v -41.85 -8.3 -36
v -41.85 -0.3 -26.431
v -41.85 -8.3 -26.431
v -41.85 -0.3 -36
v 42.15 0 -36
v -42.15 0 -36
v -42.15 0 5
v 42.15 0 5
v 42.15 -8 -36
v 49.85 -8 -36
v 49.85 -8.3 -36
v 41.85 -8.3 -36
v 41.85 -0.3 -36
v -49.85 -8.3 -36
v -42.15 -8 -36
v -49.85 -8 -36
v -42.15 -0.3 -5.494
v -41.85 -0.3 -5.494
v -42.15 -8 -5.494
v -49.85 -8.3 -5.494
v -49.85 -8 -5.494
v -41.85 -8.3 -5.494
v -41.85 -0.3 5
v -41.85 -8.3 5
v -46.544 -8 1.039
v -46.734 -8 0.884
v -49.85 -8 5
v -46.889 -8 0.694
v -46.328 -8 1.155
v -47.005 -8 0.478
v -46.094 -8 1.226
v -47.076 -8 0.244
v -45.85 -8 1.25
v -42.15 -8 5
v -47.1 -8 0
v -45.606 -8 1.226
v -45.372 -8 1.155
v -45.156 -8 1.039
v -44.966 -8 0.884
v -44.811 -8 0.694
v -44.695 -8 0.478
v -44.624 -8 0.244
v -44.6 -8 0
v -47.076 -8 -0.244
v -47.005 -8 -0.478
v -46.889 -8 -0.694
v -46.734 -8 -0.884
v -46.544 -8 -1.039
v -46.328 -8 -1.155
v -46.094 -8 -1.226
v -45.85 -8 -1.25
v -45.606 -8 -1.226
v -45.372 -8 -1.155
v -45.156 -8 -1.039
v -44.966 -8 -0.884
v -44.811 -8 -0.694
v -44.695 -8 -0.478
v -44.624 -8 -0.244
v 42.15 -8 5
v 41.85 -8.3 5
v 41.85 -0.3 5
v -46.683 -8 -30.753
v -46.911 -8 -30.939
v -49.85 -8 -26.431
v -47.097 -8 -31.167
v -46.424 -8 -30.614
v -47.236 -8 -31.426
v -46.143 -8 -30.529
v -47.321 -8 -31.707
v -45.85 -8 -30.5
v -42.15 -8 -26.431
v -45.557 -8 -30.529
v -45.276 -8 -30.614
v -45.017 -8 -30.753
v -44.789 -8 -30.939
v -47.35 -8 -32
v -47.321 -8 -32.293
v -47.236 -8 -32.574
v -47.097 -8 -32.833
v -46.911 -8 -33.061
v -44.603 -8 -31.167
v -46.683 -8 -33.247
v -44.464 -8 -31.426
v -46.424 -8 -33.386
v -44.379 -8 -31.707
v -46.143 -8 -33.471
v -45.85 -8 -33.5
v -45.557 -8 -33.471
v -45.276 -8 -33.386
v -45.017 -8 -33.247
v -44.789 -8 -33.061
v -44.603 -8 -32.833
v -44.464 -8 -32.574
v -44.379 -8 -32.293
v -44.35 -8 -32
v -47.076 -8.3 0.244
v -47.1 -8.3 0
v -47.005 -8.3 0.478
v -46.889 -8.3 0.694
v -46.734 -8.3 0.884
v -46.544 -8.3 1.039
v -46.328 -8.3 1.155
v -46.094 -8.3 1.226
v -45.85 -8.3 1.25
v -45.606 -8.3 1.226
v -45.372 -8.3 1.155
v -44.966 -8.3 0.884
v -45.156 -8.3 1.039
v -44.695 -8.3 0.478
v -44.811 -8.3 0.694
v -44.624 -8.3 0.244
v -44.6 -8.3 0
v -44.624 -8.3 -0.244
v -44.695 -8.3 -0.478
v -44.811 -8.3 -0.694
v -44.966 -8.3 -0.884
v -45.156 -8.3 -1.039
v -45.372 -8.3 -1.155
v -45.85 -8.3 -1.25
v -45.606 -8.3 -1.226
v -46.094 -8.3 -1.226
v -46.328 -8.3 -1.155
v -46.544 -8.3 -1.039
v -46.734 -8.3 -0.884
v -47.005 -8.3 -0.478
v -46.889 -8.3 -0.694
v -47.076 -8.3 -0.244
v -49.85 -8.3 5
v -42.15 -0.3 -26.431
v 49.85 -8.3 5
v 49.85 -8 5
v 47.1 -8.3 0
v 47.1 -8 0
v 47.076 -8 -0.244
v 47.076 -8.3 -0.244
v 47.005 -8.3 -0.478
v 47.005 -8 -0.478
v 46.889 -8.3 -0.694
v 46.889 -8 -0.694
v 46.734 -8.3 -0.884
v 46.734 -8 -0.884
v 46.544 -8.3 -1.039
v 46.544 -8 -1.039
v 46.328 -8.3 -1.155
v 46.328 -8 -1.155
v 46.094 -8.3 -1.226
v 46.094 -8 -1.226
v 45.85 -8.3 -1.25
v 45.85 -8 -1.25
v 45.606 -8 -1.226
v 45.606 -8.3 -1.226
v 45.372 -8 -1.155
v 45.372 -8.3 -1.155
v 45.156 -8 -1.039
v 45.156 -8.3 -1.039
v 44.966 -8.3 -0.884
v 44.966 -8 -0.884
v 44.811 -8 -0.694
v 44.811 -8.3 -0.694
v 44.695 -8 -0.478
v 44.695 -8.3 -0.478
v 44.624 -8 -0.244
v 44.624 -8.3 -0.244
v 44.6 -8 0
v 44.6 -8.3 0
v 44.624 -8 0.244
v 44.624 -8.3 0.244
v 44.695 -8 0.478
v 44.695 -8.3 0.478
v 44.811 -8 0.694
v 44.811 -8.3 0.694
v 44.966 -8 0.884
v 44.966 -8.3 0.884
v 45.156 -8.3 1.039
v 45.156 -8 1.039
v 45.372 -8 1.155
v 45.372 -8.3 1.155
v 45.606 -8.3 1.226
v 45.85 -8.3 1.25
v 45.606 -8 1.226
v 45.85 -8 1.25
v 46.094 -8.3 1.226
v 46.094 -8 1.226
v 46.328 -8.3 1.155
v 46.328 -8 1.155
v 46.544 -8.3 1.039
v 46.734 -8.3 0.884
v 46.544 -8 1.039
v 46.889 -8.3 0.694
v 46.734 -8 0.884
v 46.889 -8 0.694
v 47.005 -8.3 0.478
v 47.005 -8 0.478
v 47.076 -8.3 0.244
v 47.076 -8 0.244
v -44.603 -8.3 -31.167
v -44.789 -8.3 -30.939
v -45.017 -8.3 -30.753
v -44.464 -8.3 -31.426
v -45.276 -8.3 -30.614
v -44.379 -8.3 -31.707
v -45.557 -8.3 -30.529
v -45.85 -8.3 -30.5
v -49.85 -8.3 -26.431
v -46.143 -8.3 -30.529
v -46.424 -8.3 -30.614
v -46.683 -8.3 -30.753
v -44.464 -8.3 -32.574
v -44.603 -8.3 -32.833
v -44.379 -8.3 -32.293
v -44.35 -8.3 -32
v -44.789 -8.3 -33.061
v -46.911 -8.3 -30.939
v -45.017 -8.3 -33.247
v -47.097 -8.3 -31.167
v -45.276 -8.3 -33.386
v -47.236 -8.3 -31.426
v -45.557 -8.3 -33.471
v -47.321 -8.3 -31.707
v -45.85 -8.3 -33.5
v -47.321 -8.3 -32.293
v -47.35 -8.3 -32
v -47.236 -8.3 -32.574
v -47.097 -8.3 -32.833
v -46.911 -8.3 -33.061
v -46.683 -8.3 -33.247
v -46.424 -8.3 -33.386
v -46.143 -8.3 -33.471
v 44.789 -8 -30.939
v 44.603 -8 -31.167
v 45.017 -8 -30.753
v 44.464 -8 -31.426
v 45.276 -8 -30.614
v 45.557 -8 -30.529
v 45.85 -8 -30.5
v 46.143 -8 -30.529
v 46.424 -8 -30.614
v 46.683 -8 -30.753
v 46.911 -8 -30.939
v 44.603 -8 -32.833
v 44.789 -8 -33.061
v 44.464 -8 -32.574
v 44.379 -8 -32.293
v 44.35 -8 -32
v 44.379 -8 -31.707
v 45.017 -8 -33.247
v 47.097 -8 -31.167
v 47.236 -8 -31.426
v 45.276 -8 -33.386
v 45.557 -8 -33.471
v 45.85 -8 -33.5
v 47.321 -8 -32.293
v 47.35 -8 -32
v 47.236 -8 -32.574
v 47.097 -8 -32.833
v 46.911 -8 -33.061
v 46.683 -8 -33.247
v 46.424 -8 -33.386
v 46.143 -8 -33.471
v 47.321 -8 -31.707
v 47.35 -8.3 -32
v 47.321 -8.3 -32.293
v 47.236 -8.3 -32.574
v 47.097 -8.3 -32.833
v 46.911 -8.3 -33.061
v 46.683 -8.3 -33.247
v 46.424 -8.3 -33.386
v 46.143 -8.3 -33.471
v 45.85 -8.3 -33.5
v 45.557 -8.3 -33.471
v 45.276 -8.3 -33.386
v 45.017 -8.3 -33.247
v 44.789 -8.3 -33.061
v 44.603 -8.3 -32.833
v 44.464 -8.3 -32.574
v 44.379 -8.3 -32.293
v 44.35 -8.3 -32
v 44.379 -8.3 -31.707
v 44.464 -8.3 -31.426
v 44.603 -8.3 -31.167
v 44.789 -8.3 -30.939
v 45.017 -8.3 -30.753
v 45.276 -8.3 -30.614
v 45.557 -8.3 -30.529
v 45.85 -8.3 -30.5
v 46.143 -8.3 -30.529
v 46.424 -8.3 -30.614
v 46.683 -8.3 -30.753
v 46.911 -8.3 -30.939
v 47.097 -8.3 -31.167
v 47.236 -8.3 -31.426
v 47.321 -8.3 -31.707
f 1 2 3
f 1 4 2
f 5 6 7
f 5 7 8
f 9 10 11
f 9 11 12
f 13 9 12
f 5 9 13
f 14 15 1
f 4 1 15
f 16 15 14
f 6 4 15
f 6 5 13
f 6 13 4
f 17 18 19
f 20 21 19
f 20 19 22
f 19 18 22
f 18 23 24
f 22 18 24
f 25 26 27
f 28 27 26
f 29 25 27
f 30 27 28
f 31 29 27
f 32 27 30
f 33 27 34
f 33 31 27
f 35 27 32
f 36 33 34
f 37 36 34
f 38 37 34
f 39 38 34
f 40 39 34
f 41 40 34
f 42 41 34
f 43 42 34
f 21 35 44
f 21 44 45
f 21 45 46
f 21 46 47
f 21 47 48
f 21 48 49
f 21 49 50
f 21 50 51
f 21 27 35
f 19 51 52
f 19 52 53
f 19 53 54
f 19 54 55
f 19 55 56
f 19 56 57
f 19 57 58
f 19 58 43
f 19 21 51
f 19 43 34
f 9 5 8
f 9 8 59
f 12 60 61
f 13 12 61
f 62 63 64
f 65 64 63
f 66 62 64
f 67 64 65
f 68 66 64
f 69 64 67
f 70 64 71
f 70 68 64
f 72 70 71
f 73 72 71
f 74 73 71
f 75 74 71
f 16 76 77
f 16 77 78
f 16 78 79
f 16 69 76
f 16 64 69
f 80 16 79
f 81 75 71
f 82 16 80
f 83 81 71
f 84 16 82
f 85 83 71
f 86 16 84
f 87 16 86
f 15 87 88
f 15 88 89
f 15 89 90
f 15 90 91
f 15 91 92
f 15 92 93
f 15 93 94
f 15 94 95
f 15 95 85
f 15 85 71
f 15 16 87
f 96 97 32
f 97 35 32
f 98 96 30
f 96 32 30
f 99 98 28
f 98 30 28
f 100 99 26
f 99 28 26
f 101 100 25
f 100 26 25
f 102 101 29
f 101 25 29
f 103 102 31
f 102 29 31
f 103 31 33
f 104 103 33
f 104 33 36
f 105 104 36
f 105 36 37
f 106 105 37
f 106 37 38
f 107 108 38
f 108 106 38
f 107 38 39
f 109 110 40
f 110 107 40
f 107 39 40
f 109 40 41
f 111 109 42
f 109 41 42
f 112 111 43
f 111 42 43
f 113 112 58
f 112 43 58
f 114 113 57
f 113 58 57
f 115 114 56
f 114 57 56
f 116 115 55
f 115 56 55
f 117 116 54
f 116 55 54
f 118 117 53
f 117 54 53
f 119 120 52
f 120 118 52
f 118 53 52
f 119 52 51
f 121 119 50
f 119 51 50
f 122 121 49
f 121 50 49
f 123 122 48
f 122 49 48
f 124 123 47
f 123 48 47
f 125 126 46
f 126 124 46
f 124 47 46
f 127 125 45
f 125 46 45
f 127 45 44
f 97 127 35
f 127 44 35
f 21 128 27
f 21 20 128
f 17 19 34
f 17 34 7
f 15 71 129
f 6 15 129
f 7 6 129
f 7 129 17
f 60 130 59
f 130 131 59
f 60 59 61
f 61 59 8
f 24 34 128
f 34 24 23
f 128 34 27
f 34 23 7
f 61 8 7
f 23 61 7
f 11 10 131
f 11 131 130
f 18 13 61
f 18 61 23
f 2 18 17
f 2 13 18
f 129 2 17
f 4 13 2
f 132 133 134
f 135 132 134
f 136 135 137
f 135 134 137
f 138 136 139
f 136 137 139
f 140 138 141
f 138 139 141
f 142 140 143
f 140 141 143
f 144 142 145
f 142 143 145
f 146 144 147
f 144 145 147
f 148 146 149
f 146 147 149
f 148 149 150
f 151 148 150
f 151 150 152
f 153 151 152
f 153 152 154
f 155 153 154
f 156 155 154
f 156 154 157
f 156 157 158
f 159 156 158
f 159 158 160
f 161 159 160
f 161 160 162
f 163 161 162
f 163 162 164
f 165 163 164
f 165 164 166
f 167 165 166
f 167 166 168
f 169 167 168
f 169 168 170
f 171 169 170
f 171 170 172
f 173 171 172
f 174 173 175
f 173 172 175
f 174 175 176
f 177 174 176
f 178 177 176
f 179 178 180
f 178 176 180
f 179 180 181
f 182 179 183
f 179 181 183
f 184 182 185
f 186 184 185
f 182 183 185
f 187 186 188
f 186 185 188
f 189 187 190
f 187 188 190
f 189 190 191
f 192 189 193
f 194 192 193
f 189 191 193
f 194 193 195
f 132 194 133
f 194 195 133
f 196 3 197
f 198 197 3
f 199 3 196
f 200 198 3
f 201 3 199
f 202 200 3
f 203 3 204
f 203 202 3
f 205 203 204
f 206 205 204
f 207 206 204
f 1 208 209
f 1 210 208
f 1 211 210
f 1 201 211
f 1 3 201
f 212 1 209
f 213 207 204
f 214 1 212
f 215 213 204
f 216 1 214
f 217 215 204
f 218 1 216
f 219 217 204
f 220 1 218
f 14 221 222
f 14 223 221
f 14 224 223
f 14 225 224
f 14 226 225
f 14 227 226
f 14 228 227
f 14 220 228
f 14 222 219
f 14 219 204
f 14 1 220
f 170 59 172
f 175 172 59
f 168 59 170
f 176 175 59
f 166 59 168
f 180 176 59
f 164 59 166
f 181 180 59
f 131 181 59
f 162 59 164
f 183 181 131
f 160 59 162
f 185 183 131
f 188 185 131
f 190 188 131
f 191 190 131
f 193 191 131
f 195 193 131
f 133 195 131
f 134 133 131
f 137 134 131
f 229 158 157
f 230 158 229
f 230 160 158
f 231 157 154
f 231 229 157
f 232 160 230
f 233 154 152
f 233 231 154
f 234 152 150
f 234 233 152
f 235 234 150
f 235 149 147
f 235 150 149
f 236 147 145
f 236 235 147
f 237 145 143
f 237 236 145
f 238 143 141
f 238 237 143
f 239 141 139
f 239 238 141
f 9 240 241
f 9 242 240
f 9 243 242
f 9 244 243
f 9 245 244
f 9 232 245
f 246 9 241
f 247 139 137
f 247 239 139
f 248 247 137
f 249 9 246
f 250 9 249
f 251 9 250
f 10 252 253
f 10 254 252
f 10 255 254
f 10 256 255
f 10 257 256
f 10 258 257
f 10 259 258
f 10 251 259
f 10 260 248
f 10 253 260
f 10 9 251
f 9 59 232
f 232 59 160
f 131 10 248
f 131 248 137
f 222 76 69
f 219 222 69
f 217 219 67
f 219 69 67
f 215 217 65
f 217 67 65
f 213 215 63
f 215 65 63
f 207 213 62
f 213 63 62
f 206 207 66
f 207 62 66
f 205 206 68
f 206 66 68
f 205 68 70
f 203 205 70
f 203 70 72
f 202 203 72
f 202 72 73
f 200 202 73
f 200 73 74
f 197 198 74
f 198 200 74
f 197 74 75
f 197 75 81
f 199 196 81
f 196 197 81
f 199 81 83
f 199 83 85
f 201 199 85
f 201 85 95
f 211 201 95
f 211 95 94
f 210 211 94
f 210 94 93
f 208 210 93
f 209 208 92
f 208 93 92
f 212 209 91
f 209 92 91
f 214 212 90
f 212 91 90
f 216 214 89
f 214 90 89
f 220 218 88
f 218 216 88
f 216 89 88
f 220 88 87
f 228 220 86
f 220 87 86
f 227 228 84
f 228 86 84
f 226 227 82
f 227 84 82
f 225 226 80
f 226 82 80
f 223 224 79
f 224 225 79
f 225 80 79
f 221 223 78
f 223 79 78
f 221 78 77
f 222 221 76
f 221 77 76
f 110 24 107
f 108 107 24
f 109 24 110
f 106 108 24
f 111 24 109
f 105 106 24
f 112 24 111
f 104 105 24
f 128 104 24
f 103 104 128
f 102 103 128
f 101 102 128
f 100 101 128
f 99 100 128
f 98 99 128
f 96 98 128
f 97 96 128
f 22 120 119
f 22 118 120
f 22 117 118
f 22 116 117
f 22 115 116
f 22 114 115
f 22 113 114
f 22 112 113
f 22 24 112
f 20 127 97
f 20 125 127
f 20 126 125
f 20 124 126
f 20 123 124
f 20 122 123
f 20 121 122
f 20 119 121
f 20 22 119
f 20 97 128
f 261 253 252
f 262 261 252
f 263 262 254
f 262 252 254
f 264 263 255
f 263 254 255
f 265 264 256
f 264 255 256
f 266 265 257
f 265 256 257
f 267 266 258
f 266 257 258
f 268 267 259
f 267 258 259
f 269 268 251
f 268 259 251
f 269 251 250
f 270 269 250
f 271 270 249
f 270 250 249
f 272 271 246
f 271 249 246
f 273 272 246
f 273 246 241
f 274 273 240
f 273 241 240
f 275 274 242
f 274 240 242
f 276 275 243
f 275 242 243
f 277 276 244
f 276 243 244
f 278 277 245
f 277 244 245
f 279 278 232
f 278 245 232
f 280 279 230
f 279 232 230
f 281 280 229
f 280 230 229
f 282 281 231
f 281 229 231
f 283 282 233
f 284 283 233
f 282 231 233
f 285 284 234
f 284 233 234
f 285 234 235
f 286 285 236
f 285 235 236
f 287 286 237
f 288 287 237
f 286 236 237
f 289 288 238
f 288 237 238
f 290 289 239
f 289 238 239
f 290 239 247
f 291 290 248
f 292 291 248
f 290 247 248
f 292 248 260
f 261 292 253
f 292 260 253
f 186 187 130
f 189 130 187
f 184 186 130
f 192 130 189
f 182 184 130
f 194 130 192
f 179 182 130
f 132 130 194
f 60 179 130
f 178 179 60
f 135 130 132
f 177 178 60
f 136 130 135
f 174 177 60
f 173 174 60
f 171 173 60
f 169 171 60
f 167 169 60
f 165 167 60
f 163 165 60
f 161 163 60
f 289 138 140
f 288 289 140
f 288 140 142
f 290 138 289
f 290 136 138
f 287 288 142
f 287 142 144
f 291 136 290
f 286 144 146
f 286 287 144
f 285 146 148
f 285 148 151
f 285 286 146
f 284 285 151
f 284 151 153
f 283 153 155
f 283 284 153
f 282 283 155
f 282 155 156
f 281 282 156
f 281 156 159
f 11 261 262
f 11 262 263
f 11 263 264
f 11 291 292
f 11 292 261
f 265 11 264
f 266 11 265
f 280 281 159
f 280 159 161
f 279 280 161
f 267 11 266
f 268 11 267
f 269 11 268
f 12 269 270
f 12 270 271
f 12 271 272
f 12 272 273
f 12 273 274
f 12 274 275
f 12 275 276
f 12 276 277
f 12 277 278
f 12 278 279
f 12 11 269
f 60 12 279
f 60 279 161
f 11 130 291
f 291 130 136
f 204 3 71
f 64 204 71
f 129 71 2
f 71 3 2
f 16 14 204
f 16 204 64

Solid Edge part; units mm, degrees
sketch "Sketch1" plane through (0, 0, 0) normal (0, 0, 1) x (1, 0, 0)
  line L0 (41.85, -0.3) -> (0, -0.3)
  line L1 (0, -0.3) -> (0, 0)
  line L2 (0, 0) -> (42.15, 0)
  line L3 (42.15, 0) -> (42.15, -8)
  line L4 (42.15, -8) -> (49.85, -8)
  line L5 (49.85, -8) -> (49.85, -8.3)
  line L6 (49.85, -8.3) -> (41.85, -8.3)
  line L7 (41.85, -8.3) -> (41.85, -0.3)
extrude "ExtrudedProtrusion_1" add sketch "Sketch1" along normal blind 5 and the other way blind 36
sketch "Sketch2" plane through (0, 0, 0) normal (0, -1, 0) x (1, 0, 0)
  circle A0 centre (45.85, 0) radius 1.25
  circle A1 centre (45.85, -32) radius 1.5
  dimension "D1" = 2.5
  dimension "D2" = 32
extrude "Cutout1" cut sketch "Sketch2" along normal up to next
mirror "Mirror1" about plane through (0, 0, 0) normal (1, 0, 0) of "ExtrudedProtrusion_1", "Cutout1"
sketch "Sketch3" plane through (0, 0, 0) normal (1, 0, 0) x (0, 1, 0)
  line L0 (-15.6936, -26.4307) -> (-0.3, -26.4307)
  line L1 (-0.3, -26.4307) -> (-0.3, -5.4939)
  line L2 (-0.3, -5.4939) -> (-15.6936, -5.4939)
  line L3 (-15.6936, -5.4939) -> (-15.6936, -26.4307)
extrude "Cutout2" cut sketch "Sketch3" against normal up to next
